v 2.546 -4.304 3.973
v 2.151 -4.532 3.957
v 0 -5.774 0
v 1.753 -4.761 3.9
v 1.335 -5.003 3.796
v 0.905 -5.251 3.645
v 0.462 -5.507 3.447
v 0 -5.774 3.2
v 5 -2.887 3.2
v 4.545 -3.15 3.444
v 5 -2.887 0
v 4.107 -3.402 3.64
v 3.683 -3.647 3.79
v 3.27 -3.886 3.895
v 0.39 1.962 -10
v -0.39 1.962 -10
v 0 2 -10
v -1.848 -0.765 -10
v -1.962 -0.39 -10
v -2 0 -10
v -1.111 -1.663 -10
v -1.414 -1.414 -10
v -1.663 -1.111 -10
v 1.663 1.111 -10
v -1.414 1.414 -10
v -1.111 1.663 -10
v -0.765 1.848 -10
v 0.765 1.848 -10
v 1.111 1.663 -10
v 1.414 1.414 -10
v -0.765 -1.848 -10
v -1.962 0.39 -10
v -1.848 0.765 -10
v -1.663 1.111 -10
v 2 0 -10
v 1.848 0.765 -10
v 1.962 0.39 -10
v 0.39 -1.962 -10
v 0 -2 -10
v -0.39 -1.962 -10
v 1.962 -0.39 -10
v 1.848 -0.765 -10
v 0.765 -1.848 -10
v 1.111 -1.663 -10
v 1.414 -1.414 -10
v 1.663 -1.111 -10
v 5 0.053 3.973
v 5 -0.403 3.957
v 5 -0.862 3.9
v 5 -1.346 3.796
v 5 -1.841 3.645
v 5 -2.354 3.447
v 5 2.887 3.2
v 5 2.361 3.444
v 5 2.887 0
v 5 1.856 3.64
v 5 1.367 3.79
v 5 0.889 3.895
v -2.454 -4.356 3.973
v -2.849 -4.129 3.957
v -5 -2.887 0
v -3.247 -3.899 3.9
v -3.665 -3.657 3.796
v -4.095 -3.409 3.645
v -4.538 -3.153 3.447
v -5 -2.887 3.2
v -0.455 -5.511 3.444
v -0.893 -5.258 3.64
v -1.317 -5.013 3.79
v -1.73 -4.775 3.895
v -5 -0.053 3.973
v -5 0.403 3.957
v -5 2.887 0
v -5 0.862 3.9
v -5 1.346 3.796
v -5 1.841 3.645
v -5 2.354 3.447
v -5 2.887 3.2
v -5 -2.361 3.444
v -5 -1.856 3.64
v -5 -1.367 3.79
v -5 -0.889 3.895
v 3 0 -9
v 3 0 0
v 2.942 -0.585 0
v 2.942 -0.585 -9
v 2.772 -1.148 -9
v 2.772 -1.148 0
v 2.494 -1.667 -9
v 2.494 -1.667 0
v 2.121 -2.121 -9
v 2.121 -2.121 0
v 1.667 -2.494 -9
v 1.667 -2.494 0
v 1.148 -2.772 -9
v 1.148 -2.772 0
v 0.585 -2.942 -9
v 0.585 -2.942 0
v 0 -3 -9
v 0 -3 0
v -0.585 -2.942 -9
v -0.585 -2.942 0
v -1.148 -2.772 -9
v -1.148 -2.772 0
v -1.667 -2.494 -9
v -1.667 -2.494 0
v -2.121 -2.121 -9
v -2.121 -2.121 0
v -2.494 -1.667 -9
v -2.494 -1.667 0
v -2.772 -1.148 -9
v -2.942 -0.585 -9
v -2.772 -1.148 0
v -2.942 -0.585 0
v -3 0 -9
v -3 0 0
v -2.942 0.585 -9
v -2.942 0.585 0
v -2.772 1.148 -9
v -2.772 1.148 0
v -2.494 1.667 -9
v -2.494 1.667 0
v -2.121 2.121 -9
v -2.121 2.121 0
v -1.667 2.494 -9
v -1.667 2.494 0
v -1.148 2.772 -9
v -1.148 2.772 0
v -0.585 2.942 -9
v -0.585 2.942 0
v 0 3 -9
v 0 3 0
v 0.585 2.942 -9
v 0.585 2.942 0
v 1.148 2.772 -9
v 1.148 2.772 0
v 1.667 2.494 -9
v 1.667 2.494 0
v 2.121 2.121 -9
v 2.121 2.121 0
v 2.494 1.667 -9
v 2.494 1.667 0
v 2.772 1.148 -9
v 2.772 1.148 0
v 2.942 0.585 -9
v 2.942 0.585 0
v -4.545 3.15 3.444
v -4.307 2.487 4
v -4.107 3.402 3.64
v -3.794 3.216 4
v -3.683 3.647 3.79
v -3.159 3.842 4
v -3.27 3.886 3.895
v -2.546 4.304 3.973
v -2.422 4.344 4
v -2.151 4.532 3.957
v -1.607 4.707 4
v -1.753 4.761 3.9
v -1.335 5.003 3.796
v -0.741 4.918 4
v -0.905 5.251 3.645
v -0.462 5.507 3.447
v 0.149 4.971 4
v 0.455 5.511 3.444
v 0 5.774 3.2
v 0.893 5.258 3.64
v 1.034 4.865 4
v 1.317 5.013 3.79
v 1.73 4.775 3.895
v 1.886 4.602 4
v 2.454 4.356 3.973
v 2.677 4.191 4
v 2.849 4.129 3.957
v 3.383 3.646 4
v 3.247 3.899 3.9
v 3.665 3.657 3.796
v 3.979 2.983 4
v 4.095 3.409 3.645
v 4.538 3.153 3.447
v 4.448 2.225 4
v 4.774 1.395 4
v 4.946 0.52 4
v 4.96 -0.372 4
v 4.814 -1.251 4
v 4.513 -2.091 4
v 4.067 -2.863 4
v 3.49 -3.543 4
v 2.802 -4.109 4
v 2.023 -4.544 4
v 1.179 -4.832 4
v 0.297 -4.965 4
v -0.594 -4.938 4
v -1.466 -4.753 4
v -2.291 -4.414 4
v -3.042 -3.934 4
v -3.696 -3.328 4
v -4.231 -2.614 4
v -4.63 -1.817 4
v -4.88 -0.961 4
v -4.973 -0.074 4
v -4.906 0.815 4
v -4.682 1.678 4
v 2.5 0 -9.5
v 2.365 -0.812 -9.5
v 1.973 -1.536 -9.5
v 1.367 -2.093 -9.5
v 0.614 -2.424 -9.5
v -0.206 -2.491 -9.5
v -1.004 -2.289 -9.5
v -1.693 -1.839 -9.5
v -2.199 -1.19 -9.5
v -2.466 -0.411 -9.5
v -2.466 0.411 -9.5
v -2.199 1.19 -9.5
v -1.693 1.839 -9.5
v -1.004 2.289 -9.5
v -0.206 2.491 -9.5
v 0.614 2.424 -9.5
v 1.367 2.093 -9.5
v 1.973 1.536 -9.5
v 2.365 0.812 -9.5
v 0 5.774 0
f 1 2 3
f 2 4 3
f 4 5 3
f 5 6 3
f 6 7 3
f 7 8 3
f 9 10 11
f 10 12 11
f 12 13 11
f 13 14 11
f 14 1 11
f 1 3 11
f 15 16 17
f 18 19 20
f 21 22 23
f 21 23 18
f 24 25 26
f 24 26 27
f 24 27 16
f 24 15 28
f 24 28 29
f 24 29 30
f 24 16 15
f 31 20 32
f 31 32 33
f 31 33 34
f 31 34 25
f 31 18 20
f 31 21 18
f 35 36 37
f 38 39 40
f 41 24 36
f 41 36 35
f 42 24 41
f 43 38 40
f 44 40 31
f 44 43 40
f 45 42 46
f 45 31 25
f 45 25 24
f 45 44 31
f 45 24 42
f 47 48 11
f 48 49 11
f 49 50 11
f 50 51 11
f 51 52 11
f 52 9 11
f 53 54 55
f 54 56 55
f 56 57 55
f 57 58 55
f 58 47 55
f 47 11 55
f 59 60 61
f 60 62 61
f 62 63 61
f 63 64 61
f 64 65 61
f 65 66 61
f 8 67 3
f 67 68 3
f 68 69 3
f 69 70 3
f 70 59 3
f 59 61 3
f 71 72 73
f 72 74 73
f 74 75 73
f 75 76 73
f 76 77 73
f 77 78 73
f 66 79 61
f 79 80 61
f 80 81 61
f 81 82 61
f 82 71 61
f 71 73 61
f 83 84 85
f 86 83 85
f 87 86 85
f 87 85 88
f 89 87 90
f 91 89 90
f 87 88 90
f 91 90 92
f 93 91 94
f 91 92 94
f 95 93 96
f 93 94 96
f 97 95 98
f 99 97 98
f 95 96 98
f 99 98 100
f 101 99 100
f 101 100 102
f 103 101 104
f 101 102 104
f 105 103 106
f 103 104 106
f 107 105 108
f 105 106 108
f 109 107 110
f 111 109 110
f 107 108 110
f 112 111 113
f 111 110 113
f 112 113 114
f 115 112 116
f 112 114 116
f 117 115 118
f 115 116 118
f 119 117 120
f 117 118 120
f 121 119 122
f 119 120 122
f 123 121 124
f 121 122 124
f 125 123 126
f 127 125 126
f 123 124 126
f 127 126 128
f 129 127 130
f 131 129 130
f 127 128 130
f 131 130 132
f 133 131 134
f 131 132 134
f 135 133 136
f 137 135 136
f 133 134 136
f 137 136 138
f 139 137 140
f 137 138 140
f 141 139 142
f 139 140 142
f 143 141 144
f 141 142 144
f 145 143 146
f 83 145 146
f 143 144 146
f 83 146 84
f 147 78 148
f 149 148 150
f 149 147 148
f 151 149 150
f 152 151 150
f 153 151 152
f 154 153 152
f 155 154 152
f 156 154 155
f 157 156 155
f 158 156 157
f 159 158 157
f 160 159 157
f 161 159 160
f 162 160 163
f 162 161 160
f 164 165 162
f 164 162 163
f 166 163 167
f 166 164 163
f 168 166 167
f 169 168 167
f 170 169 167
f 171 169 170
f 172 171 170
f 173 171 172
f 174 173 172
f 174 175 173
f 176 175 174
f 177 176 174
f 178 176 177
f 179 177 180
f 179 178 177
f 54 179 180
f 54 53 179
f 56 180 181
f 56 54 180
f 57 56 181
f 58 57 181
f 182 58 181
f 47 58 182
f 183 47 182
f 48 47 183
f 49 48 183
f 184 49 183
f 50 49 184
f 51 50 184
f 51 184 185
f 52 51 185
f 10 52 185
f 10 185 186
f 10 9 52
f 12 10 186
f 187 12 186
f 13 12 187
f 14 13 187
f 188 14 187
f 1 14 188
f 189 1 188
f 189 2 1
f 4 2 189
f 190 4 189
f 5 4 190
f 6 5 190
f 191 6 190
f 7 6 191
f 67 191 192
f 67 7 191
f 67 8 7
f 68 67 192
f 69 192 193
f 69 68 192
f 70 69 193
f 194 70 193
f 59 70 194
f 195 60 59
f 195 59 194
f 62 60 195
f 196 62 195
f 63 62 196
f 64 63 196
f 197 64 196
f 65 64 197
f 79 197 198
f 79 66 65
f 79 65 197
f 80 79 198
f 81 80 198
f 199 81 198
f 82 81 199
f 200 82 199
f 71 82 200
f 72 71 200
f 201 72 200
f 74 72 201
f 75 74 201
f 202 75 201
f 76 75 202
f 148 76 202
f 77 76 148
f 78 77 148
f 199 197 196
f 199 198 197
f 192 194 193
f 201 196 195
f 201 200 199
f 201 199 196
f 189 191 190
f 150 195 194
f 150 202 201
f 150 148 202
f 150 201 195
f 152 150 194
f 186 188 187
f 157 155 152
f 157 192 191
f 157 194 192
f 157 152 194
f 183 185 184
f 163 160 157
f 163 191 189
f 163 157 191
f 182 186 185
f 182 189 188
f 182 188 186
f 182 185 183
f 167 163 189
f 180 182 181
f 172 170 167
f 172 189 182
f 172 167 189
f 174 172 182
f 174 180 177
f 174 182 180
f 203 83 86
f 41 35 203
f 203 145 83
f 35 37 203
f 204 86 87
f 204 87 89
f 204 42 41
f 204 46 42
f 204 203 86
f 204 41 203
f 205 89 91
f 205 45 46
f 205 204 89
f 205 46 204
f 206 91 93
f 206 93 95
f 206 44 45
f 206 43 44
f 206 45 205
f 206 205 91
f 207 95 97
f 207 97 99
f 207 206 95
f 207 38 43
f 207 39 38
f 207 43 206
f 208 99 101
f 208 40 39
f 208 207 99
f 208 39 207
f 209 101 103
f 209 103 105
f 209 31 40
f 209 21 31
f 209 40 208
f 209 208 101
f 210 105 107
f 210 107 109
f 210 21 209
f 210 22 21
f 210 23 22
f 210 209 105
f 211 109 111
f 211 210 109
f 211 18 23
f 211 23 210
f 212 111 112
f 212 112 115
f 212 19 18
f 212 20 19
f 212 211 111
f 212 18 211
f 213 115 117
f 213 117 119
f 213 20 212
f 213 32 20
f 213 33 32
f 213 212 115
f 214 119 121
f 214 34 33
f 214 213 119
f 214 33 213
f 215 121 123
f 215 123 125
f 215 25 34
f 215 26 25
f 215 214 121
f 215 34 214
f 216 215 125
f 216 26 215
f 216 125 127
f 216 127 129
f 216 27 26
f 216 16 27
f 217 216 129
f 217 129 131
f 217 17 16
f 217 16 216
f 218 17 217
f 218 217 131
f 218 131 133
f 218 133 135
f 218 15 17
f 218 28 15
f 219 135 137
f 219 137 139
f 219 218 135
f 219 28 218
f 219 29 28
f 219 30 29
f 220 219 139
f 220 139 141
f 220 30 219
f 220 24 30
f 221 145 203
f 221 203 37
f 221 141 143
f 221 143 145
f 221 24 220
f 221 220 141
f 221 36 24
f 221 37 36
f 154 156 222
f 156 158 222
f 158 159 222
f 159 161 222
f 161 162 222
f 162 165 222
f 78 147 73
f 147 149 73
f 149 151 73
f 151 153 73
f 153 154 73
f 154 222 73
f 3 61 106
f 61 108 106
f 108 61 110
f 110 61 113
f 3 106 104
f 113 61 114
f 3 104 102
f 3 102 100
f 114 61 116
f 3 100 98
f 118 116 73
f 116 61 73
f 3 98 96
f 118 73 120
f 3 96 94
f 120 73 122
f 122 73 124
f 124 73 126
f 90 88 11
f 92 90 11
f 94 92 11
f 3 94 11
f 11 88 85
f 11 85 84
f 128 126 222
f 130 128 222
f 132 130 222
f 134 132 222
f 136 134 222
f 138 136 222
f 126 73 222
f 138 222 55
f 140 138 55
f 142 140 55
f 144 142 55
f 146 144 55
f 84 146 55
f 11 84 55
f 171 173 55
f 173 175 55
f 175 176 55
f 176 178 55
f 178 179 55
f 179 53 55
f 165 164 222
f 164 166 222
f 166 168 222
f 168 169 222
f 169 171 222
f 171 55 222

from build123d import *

# Parameters (mm, degrees)
EXTRUDE_1_DEPTH = 4
SKETCH_2_R      = 3
EXTRUDE_2_DEPTH = 10
CHAMFER_1_SIZE  = 1


with BuildPart() as part:
    # Эскиз1 → Вытянуть1 (new body)
    with BuildSketch(Plane.XY):
        Polygon((0, 5.773502692), (-5, 2.886751346), (-5, -2.886751346), (0, -5.773502692), (5, -2.886751346), (5, 2.886751346), align=None)
    extrude(amount=EXTRUDE_1_DEPTH)

    # Эскиз2 → Вытянуть2 (add)
    with BuildSketch(Plane(origin=(0, 0, 0), x_dir=(-1, 0, 0), z_dir=(0, 0, -1))):
        with Locations(Location((0, 0, 0), (0, 0, 180))):
            Circle(SKETCH_2_R)
    extrude(amount=EXTRUDE_2_DEPTH)

    # Эскиз15 → Вырез-Повернуть1 (revolve, cut)
    with BuildSketch(Plane(origin=(0, 0, 0), x_dir=(0, 0, -1), z_dir=(1, 0, 0)), mode=Mode.PRIVATE) as cut_revolve_1_sk:
        Polygon((-4, 5.773502692), (-4, 4.973502692), (-3.2, 5.773502692), align=None)
    revolve(cut_revolve_1_sk.sketch.rotate(Axis((0, 0, 2.465296569), (0, 0, -1)), 300.000000095), axis=Axis((0, 0, 2.465296569), (0, 0, -1)), mode=Mode.SUBTRACT)

    # Фаска1
    chamfer_1_edges = [part.edges().sort_by_distance(p)[0] for p in [
        (-3, 0, -10),
    ]]
    chamfer(chamfer_1_edges, length=CHAMFER_1_SIZE)


solid = part.part
